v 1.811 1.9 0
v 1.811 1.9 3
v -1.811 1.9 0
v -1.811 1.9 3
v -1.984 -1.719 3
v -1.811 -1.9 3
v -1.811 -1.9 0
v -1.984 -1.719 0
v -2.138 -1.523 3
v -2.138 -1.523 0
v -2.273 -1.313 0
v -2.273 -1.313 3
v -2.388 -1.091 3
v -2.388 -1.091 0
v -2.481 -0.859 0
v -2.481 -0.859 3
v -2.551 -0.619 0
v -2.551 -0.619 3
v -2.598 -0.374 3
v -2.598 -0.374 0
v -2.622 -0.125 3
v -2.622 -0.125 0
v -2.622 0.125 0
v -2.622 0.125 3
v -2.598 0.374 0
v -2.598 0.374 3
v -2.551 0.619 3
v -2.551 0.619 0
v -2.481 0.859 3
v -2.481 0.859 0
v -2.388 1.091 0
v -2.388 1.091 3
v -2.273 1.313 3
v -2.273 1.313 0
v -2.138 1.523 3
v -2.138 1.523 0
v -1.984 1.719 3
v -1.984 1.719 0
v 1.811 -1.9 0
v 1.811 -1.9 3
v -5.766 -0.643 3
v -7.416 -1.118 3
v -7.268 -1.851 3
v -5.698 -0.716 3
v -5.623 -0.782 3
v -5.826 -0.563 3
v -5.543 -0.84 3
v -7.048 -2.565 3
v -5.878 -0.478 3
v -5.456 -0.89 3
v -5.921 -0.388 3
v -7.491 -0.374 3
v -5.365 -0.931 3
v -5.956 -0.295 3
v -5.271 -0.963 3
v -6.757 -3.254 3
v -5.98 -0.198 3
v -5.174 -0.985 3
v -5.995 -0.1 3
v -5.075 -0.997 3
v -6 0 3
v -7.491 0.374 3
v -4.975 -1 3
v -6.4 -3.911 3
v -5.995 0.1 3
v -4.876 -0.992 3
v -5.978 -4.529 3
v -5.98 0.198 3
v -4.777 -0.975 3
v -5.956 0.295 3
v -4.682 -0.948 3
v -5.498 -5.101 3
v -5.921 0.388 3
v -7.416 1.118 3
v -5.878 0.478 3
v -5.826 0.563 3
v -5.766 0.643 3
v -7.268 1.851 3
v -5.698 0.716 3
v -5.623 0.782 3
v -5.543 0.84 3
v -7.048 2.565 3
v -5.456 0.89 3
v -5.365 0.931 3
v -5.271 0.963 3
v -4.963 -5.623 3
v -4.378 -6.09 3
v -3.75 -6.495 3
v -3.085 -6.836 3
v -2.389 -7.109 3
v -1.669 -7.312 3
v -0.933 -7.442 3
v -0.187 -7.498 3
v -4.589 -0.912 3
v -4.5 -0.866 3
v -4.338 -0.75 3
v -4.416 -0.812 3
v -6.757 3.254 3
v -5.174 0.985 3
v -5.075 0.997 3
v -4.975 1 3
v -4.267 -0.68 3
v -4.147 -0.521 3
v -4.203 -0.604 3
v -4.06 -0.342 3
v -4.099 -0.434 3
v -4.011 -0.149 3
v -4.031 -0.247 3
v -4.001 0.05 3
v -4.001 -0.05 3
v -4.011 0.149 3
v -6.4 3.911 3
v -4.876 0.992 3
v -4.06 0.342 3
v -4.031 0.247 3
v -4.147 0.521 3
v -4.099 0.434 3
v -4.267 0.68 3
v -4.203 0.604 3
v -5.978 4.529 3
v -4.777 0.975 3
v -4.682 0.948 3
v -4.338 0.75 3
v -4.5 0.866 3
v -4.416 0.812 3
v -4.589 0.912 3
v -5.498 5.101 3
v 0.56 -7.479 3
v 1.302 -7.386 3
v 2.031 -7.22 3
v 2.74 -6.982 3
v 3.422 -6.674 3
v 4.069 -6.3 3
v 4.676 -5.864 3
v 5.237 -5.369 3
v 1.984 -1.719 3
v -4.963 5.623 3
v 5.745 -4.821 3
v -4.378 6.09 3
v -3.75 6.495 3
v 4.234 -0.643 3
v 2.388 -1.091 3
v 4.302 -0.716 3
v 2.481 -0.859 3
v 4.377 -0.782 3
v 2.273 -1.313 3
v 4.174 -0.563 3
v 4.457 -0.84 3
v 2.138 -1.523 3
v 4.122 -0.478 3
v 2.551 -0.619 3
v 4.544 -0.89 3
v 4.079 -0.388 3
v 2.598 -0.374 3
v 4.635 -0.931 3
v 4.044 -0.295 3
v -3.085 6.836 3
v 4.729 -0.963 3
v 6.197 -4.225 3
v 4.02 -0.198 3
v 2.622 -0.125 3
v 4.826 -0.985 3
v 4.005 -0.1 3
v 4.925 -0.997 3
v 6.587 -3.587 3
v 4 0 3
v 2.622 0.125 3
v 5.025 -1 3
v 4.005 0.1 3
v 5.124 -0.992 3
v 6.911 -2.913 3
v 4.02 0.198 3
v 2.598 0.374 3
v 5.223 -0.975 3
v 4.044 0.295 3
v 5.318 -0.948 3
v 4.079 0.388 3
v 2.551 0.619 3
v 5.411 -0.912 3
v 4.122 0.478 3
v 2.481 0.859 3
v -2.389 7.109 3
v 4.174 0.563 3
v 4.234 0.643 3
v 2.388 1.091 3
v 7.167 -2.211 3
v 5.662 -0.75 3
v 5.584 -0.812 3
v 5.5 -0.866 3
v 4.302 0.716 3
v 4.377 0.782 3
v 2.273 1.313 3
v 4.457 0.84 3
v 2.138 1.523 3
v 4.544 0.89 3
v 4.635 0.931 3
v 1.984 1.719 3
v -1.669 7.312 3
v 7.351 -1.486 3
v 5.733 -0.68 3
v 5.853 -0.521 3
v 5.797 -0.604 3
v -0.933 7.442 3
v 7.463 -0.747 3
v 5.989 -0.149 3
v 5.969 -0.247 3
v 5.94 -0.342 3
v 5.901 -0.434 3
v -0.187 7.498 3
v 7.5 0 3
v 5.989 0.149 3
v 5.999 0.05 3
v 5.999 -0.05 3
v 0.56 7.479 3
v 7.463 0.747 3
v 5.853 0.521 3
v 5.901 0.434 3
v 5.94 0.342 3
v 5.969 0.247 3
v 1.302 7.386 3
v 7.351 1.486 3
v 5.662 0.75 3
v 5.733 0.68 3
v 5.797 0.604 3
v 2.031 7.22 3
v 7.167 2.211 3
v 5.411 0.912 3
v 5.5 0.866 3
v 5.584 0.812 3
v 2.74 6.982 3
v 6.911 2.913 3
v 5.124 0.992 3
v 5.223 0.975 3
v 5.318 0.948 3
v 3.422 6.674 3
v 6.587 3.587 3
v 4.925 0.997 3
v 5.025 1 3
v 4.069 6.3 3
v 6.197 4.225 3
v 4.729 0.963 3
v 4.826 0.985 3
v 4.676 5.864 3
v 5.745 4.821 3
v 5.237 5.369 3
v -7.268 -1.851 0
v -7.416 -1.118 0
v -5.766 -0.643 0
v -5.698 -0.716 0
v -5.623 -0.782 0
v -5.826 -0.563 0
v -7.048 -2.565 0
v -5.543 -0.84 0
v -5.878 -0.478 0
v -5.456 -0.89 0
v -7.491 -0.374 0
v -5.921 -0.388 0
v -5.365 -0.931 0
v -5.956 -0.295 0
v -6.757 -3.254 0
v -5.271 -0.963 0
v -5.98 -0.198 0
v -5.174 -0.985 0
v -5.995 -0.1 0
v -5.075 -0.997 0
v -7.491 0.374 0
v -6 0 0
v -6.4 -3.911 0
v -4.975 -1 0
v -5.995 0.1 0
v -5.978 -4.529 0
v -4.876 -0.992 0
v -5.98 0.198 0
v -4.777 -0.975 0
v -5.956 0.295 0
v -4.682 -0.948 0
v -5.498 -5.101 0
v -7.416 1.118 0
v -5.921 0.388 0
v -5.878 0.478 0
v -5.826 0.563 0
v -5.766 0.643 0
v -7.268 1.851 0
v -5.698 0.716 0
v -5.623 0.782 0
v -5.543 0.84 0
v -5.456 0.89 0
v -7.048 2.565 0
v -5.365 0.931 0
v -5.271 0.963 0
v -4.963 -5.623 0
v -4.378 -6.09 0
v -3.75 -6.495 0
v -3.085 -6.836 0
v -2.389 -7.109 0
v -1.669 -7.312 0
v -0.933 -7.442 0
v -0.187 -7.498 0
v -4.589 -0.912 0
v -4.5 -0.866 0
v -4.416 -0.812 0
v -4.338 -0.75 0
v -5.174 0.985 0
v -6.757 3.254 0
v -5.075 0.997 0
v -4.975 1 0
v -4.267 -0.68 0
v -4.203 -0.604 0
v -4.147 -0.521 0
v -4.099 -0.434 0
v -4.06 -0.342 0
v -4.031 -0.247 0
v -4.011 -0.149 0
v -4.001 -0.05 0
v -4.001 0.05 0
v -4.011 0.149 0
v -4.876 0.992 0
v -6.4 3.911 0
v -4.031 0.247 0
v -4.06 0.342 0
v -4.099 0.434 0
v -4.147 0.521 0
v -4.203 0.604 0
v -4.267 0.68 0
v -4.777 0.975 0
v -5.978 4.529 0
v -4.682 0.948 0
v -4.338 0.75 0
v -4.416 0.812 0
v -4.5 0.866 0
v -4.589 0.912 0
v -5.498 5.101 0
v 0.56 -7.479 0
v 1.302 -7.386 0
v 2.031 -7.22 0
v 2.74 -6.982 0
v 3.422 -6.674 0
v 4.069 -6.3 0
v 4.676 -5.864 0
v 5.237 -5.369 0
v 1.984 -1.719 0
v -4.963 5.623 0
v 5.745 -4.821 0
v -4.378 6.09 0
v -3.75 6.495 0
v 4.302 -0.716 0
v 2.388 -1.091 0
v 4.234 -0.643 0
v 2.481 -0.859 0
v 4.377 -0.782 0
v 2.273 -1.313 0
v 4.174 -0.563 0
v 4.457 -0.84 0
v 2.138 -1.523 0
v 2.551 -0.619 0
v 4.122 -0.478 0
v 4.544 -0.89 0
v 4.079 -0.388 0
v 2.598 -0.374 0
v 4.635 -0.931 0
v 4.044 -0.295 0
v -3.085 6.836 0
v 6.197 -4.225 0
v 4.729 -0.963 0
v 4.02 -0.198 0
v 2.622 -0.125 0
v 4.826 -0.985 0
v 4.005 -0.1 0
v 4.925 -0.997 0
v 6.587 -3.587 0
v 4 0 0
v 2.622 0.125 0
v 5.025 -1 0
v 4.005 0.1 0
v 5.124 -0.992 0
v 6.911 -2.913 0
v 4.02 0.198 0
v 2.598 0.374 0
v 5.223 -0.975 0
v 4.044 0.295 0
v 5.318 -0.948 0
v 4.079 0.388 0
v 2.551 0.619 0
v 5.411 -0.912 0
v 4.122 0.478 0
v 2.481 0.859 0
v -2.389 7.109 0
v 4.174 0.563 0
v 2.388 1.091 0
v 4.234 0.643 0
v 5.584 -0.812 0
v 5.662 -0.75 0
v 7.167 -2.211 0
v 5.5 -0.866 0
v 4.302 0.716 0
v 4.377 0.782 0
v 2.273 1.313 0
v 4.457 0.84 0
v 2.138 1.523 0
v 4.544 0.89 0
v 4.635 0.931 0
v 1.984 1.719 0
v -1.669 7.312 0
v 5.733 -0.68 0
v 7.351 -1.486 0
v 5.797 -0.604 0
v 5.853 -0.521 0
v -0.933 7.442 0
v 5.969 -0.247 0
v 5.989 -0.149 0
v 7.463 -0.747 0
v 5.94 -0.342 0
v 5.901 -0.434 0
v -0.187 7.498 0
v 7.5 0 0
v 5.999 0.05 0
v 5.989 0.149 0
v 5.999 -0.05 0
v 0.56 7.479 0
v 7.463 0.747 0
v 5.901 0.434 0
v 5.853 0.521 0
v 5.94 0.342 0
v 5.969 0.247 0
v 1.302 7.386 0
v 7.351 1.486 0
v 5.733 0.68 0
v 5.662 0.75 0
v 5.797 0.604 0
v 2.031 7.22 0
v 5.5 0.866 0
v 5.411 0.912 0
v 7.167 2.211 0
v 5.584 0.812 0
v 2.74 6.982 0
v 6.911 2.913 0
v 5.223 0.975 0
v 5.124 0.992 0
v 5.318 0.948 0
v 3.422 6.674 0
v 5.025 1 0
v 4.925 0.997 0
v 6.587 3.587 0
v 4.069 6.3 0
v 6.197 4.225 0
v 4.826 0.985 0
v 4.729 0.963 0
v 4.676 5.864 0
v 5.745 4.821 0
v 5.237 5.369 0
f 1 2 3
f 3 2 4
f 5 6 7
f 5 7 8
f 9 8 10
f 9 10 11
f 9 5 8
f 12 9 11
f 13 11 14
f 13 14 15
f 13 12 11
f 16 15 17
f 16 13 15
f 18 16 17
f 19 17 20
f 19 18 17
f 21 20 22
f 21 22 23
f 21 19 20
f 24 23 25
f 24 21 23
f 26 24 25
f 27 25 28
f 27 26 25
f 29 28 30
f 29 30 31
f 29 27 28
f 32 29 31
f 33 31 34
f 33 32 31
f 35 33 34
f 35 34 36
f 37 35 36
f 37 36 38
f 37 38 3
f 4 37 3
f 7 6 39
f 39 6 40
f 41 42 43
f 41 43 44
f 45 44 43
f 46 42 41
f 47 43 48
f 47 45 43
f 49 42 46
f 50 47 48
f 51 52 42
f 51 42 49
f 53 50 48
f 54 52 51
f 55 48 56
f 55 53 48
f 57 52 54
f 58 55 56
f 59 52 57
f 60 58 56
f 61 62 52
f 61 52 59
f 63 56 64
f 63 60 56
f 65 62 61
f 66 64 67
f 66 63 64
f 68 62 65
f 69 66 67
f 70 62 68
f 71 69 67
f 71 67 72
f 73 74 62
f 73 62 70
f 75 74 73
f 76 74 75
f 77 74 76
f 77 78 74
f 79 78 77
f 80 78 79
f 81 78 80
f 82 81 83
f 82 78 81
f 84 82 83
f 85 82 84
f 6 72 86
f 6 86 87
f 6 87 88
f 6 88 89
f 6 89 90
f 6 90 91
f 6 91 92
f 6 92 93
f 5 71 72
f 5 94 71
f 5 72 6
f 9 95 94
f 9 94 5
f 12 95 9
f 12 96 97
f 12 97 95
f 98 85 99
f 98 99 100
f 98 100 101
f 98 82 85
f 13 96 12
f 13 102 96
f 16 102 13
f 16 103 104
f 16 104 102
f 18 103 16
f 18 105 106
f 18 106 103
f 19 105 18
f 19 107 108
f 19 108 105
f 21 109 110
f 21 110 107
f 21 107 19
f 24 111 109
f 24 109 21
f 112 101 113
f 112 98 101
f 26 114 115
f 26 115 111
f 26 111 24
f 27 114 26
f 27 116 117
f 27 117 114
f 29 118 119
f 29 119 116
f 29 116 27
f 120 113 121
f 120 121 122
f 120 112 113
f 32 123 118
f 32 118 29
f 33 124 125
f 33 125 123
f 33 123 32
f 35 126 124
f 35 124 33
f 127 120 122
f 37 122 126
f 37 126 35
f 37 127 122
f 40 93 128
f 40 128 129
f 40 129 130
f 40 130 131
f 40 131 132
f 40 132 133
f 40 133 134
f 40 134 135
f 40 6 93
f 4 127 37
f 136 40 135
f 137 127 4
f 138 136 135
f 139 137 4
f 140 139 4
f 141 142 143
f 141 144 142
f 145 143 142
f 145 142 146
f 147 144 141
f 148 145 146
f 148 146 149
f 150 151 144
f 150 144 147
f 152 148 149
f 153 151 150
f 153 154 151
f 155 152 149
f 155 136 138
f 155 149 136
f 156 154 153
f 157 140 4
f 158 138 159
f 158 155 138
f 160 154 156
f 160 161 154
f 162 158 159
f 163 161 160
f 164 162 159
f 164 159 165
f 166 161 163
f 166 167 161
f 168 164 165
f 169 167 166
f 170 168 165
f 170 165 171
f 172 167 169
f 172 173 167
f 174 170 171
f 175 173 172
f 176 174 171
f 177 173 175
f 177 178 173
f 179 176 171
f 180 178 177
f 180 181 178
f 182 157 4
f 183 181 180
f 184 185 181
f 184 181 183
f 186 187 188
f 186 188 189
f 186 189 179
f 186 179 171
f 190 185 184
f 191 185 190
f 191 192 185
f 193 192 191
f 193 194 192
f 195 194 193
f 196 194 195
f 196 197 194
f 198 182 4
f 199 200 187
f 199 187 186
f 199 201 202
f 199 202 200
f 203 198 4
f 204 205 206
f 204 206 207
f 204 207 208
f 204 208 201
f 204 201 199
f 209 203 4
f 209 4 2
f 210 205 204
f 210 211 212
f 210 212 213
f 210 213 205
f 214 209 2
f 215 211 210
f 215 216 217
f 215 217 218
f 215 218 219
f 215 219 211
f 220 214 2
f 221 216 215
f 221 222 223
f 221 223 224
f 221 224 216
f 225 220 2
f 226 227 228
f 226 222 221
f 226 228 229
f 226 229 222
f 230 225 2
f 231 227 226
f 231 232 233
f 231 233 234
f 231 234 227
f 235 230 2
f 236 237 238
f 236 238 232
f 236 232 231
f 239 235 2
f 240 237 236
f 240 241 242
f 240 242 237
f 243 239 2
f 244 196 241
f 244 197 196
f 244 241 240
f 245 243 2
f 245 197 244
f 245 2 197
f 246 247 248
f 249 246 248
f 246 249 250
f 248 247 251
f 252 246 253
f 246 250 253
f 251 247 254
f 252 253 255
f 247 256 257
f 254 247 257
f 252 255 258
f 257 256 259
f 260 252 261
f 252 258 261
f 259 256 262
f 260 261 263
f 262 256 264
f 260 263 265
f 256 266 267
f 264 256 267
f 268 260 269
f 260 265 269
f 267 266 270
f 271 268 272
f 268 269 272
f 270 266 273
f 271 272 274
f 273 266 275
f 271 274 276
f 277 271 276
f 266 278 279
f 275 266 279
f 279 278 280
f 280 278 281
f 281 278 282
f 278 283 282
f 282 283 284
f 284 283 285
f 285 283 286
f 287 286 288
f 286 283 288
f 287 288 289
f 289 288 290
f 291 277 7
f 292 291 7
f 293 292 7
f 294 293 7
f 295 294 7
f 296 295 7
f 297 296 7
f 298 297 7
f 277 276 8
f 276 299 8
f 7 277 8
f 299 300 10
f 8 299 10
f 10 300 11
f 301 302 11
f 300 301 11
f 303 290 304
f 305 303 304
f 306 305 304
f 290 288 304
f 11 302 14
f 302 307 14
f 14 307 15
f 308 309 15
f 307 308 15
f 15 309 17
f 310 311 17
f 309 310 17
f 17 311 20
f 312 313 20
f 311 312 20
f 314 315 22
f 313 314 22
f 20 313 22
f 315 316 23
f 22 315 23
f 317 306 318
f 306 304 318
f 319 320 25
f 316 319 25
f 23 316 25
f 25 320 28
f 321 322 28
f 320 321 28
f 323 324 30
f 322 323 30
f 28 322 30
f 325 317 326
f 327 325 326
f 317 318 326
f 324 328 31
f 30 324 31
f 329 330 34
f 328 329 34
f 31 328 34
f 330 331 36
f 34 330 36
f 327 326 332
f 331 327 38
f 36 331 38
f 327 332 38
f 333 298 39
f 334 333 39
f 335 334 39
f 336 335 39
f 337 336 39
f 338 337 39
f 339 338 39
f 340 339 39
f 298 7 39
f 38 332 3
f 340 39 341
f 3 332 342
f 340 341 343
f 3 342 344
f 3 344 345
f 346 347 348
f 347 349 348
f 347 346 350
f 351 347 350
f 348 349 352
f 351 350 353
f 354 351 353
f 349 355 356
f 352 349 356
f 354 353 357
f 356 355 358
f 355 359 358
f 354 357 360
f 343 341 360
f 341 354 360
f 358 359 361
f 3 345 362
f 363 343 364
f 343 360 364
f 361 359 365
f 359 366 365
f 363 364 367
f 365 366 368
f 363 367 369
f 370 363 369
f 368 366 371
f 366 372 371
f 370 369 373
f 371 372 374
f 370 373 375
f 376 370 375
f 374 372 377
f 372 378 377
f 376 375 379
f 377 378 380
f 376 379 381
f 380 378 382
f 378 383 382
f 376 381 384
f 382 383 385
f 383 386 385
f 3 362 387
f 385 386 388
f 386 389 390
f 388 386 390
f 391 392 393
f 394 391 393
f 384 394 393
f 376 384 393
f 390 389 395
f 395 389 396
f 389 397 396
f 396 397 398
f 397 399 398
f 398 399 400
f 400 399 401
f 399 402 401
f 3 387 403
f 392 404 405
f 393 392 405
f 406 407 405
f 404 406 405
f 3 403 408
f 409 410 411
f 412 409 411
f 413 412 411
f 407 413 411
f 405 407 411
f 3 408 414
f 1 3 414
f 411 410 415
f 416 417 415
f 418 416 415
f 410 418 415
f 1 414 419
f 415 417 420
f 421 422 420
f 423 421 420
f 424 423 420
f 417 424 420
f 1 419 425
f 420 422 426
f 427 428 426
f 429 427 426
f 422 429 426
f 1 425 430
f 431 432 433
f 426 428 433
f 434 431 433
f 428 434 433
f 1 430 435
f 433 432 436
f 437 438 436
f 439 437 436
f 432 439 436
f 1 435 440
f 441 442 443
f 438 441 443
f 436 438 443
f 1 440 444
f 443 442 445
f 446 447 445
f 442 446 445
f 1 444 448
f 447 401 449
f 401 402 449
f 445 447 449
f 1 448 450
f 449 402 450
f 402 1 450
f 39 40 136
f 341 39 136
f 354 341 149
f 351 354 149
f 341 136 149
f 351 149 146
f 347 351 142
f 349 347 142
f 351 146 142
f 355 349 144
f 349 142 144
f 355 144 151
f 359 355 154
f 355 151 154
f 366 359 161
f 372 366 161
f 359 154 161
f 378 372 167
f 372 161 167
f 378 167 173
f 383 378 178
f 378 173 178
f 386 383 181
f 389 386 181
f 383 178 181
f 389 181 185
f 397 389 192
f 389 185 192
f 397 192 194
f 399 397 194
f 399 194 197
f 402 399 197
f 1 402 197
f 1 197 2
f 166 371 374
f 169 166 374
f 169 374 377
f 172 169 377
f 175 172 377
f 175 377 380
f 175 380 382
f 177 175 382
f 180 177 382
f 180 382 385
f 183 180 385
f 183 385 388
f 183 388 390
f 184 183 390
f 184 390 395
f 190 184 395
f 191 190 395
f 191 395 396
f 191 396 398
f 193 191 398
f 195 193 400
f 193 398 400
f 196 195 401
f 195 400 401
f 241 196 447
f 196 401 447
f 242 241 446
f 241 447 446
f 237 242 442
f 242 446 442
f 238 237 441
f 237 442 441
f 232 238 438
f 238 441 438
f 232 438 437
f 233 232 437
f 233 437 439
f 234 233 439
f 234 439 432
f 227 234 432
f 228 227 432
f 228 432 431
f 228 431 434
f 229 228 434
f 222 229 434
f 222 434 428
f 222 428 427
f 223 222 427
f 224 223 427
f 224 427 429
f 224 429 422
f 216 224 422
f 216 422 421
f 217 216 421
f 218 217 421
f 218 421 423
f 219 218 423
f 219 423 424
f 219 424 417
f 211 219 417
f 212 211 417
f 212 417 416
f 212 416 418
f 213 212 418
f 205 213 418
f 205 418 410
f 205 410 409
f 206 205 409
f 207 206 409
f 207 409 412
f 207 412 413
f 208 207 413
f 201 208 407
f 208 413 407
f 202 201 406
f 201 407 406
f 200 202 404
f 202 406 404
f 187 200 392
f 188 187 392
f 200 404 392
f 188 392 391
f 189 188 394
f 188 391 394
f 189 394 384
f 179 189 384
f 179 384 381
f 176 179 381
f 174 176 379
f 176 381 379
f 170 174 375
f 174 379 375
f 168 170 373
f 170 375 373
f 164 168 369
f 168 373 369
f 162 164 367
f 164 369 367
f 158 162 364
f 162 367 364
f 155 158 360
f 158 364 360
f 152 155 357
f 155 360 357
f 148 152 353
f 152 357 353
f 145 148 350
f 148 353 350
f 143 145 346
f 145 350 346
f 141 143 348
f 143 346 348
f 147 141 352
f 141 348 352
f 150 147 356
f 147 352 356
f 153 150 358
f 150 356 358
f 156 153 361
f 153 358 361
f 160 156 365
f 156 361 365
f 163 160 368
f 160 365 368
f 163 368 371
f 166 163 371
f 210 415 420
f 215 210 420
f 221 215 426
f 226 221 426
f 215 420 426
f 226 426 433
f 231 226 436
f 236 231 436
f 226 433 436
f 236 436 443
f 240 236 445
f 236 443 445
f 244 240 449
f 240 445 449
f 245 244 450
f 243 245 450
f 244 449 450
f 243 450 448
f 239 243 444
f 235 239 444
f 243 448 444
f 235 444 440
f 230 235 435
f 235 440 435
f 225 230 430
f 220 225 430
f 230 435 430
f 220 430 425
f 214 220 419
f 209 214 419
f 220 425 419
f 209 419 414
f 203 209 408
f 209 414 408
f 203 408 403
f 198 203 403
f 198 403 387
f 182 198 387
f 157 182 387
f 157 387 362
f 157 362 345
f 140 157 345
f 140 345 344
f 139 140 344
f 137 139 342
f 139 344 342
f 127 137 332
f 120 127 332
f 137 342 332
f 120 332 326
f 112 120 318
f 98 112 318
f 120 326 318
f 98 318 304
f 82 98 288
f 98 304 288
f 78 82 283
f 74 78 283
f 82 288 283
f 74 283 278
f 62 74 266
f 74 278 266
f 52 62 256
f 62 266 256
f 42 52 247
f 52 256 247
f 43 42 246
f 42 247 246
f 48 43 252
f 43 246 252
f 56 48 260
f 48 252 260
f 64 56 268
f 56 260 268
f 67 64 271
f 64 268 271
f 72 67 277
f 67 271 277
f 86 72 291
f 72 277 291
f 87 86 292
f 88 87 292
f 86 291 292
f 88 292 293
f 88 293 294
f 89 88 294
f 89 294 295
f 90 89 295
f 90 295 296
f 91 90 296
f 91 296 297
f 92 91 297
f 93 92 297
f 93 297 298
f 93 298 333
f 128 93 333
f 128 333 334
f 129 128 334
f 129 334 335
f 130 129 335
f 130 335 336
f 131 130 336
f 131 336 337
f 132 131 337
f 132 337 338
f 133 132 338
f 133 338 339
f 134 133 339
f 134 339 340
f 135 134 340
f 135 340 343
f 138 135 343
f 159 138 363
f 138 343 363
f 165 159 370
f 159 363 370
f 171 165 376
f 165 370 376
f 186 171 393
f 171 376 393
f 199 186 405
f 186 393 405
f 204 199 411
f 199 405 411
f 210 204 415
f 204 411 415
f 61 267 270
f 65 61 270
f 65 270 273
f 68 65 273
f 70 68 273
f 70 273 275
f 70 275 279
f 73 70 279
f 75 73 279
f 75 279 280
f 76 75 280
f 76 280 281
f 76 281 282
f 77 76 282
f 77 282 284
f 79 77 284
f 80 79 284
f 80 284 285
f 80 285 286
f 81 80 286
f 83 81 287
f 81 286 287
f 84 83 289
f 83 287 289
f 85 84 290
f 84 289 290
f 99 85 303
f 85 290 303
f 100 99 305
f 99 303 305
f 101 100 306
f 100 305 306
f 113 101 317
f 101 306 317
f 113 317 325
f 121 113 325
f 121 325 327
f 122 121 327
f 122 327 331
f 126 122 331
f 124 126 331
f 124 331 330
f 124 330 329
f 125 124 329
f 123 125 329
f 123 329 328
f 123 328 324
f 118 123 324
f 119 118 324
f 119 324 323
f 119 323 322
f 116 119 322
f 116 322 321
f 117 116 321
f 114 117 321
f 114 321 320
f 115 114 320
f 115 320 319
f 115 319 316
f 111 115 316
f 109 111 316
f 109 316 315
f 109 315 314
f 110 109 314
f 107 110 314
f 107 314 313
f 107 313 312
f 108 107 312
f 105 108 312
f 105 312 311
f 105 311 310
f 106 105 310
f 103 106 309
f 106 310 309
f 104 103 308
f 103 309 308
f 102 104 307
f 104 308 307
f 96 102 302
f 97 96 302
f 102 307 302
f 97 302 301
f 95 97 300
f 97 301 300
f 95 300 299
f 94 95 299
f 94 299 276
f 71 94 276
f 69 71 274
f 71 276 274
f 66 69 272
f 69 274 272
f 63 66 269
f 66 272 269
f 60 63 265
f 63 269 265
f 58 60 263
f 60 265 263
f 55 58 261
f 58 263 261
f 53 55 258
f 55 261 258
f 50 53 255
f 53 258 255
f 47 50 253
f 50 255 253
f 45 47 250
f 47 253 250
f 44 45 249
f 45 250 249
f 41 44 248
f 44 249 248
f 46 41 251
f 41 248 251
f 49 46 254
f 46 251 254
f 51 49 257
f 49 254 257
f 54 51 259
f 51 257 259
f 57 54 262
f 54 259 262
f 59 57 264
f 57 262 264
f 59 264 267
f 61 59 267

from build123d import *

# Parameters (mm, degrees)
SKETCH1_R             = 7.5
BOSS_EXTRUDE1_DEPTH   = 3
CUT_EXTRUDE1_DEPTH    = 3
SKETCH6_W             = 1.811249569
SKETCH6_H             = 3.8
CUT_EXTRUDE2_DEPTH    = 3
F_2_0MM_DOWEL_HOLE1_D = 2


with BuildPart() as part:
    # Sketch1 → Boss-Extrude1 (new body)
    with BuildSketch(Plane.XY):
        Circle(SKETCH1_R)
    extrude(amount=BOSS_EXTRUDE1_DEPTH)

    # Sketch5 → Cut-Extrude1 (cut)
    with BuildSketch(Plane.XY.offset(3)):
        with BuildLine():
            Line((-1.811249569, 1.9), (-1.811249569, -1.9))
            ThreePointArc((-1.811249569, -1.9), (-2.625, 0), (-1.811249569, 1.9))
        make_face()
    cut_extrude1 = extrude(amount=-CUT_EXTRUDE1_DEPTH, mode=Mode.SUBTRACT)

    # Sketch6 → Cut-Extrude2 (cut)
    with BuildSketch(Plane.XY.offset(3)):
        with Locations((-0.905624785, 0)):
            Rectangle(SKETCH6_W, SKETCH6_H)
    cut_extrude2 = extrude(amount=-CUT_EXTRUDE2_DEPTH, mode=Mode.SUBTRACT)

    # Mirror1: Cut-Extrude1, Cut-Extrude2 across plane
    add(cut_extrude1.mirror(Plane(origin=(0, 0, 0), x_dir=(0, 0, 1), z_dir=(1, 0, 0))), mode=Mode.SUBTRACT)
    add(cut_extrude2.mirror(Plane(origin=(0, 0, 0), x_dir=(0, 0, 1), z_dir=(1, 0, 0))), mode=Mode.SUBTRACT)

    # Ø2.0mm Dowel Hole1 (through all)
    with Locations(Plane.XY.offset(3)):
        with Locations((5, 0), (-5, 0)):
            Hole(F_2_0MM_DOWEL_HOLE1_D / 2)


solid = part.part
